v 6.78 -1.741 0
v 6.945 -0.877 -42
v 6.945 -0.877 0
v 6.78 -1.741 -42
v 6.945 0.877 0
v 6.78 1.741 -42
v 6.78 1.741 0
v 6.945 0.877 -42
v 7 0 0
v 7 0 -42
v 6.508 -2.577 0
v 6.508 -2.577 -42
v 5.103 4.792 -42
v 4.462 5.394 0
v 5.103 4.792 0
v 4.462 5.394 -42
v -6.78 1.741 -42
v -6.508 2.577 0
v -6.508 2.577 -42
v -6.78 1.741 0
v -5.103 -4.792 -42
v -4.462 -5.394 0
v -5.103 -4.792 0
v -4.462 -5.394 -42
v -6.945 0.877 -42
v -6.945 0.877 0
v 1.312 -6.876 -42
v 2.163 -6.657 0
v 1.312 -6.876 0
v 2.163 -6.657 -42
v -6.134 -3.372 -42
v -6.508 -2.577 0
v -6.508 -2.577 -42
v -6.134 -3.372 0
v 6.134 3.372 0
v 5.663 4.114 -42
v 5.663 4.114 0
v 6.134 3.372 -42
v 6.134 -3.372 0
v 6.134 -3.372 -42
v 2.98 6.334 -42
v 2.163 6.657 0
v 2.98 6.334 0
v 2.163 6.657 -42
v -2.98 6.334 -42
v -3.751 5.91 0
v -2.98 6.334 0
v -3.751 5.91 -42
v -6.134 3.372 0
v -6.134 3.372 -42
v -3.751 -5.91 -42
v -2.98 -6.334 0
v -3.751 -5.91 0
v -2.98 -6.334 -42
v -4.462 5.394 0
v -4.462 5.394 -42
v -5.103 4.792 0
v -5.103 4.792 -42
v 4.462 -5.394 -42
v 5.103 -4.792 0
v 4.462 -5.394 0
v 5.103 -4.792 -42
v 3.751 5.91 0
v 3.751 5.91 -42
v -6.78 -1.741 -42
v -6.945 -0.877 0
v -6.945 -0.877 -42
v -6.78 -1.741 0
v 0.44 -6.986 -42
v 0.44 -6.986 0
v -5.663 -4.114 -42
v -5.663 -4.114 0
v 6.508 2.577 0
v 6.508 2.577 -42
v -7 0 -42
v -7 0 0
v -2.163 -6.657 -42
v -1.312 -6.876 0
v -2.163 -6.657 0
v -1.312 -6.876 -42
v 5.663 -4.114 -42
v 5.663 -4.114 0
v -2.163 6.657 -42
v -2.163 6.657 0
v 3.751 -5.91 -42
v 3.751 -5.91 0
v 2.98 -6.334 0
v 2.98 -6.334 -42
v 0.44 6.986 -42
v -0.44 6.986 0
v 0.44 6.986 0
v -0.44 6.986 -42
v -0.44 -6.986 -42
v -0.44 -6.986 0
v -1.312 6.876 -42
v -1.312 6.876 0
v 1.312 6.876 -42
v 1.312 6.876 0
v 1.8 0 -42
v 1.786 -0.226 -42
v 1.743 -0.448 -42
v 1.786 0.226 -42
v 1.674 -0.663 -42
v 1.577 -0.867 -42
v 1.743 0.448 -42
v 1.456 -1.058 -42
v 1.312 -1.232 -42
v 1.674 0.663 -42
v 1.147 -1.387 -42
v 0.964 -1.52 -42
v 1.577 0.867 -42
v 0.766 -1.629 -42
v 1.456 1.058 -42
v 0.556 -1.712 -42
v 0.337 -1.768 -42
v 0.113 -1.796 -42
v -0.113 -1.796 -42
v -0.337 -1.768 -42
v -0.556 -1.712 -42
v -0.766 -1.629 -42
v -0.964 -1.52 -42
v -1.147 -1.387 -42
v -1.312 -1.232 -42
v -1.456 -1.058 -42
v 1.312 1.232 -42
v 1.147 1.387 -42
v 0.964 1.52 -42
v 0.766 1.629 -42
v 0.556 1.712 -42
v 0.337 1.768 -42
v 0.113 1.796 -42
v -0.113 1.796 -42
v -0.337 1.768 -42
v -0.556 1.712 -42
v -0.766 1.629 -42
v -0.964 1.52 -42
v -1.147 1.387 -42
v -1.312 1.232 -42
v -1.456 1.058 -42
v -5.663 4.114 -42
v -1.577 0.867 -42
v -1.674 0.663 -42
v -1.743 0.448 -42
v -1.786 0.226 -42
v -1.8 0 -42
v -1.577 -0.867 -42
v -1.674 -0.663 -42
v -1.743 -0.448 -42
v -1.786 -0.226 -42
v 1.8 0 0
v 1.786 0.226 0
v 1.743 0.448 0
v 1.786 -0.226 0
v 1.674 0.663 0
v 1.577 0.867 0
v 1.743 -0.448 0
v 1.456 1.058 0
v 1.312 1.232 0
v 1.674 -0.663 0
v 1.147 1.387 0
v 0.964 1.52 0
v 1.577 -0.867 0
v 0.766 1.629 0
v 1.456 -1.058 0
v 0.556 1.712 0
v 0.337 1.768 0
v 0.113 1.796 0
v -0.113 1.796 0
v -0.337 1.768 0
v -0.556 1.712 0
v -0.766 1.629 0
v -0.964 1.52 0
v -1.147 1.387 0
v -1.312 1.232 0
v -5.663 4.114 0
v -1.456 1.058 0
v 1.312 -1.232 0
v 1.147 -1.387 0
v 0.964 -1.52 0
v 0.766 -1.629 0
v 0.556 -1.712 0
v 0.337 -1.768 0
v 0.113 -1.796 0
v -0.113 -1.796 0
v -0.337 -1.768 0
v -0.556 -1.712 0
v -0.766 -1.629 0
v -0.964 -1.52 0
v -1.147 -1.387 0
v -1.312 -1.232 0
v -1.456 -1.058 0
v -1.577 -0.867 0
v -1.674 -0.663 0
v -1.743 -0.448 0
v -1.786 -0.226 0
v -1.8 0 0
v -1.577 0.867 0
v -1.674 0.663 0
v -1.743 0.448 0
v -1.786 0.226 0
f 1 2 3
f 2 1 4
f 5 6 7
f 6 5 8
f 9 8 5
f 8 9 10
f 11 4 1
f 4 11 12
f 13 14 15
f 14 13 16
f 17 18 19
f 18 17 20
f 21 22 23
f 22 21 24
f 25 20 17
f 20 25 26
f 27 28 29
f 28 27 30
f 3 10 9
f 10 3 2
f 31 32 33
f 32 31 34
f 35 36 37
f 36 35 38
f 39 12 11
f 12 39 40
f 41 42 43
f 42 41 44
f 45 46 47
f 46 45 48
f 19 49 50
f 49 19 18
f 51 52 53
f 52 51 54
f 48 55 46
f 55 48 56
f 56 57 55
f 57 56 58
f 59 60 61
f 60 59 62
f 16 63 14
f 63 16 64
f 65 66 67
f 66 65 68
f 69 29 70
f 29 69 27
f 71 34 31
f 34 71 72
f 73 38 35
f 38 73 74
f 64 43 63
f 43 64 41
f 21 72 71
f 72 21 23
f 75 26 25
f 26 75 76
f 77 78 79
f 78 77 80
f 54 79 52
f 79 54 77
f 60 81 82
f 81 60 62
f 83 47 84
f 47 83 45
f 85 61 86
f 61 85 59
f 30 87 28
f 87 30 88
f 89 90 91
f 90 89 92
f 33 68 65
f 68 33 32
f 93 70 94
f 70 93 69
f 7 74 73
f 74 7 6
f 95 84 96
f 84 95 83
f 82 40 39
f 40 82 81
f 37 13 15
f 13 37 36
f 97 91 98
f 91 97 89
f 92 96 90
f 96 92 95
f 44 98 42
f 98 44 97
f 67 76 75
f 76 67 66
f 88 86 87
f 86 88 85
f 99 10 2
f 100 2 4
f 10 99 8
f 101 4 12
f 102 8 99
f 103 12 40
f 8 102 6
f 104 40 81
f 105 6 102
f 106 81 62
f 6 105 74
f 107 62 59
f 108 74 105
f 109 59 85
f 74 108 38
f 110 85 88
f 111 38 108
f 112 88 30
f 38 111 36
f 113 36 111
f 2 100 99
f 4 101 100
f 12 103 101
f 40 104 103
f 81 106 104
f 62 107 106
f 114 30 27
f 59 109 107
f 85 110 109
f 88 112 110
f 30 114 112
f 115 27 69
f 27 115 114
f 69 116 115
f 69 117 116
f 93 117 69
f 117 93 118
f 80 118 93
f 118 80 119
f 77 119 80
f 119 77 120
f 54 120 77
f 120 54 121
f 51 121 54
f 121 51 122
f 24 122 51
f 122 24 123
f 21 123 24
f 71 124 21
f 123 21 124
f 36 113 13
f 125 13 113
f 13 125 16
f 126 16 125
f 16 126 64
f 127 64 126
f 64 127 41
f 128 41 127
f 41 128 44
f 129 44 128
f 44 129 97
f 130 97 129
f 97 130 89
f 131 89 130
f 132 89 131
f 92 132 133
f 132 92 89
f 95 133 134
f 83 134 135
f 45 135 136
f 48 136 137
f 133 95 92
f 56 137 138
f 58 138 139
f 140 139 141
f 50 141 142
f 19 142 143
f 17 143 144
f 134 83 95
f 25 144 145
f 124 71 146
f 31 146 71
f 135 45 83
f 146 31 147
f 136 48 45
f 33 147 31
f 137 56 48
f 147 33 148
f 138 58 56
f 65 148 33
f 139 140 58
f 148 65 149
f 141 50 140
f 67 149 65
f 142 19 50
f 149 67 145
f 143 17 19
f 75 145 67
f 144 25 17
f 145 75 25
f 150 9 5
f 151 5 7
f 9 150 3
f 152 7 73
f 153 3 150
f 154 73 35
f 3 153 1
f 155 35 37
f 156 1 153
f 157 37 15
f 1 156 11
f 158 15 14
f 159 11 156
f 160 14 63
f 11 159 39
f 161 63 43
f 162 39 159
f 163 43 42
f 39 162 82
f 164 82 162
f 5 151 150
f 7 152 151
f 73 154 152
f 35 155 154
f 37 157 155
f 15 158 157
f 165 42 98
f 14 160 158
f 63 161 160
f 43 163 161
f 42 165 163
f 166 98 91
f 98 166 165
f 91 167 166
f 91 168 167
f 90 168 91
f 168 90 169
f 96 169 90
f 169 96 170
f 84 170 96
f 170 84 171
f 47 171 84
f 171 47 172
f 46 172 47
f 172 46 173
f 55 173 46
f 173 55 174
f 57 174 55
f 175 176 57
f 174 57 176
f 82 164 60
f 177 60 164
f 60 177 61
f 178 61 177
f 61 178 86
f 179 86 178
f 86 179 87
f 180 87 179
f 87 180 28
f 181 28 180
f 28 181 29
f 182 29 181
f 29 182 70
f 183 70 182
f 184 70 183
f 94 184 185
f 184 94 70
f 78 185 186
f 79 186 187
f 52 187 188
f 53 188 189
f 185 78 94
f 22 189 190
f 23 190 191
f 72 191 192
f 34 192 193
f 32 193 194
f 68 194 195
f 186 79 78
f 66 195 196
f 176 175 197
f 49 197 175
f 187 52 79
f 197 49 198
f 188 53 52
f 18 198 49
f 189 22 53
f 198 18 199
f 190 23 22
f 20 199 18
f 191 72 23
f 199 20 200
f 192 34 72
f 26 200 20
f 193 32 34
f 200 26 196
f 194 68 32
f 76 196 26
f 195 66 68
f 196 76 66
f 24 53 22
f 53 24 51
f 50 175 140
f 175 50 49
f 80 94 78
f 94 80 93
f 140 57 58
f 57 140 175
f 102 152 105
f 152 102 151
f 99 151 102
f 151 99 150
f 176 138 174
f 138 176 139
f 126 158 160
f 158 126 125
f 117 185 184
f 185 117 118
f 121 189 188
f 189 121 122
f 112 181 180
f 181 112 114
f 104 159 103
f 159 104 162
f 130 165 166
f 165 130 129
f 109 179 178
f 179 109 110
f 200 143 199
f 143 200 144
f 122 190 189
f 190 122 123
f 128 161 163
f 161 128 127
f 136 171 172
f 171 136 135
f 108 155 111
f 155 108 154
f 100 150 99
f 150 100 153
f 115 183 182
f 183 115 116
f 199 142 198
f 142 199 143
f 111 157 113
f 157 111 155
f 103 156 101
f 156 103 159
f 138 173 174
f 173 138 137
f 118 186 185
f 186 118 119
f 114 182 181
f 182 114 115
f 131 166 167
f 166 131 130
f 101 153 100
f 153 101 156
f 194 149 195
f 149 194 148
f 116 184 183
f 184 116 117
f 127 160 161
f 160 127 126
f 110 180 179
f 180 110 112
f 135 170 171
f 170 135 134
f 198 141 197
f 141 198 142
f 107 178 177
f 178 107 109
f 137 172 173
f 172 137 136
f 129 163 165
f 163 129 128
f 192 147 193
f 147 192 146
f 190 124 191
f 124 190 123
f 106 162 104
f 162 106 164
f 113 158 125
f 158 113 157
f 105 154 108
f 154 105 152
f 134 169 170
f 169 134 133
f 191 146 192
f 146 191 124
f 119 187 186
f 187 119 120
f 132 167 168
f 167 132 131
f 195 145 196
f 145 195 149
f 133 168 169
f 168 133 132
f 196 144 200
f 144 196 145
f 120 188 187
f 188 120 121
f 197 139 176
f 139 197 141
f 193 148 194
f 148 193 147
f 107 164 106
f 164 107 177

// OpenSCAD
$fn = 50;


difference() {
	union() {
		translate(v = [0, 0, -42.0000000000]) {
			cylinder(h = 42, r = 7.0000000000);
		}
		cylinder(h = 0, r = 10.0000000000);
	}
	union() {
		#translate(v = [0, 0, -42]) {
			cylinder(h = 42, r = 1.8000000000);
		}
	}
}
